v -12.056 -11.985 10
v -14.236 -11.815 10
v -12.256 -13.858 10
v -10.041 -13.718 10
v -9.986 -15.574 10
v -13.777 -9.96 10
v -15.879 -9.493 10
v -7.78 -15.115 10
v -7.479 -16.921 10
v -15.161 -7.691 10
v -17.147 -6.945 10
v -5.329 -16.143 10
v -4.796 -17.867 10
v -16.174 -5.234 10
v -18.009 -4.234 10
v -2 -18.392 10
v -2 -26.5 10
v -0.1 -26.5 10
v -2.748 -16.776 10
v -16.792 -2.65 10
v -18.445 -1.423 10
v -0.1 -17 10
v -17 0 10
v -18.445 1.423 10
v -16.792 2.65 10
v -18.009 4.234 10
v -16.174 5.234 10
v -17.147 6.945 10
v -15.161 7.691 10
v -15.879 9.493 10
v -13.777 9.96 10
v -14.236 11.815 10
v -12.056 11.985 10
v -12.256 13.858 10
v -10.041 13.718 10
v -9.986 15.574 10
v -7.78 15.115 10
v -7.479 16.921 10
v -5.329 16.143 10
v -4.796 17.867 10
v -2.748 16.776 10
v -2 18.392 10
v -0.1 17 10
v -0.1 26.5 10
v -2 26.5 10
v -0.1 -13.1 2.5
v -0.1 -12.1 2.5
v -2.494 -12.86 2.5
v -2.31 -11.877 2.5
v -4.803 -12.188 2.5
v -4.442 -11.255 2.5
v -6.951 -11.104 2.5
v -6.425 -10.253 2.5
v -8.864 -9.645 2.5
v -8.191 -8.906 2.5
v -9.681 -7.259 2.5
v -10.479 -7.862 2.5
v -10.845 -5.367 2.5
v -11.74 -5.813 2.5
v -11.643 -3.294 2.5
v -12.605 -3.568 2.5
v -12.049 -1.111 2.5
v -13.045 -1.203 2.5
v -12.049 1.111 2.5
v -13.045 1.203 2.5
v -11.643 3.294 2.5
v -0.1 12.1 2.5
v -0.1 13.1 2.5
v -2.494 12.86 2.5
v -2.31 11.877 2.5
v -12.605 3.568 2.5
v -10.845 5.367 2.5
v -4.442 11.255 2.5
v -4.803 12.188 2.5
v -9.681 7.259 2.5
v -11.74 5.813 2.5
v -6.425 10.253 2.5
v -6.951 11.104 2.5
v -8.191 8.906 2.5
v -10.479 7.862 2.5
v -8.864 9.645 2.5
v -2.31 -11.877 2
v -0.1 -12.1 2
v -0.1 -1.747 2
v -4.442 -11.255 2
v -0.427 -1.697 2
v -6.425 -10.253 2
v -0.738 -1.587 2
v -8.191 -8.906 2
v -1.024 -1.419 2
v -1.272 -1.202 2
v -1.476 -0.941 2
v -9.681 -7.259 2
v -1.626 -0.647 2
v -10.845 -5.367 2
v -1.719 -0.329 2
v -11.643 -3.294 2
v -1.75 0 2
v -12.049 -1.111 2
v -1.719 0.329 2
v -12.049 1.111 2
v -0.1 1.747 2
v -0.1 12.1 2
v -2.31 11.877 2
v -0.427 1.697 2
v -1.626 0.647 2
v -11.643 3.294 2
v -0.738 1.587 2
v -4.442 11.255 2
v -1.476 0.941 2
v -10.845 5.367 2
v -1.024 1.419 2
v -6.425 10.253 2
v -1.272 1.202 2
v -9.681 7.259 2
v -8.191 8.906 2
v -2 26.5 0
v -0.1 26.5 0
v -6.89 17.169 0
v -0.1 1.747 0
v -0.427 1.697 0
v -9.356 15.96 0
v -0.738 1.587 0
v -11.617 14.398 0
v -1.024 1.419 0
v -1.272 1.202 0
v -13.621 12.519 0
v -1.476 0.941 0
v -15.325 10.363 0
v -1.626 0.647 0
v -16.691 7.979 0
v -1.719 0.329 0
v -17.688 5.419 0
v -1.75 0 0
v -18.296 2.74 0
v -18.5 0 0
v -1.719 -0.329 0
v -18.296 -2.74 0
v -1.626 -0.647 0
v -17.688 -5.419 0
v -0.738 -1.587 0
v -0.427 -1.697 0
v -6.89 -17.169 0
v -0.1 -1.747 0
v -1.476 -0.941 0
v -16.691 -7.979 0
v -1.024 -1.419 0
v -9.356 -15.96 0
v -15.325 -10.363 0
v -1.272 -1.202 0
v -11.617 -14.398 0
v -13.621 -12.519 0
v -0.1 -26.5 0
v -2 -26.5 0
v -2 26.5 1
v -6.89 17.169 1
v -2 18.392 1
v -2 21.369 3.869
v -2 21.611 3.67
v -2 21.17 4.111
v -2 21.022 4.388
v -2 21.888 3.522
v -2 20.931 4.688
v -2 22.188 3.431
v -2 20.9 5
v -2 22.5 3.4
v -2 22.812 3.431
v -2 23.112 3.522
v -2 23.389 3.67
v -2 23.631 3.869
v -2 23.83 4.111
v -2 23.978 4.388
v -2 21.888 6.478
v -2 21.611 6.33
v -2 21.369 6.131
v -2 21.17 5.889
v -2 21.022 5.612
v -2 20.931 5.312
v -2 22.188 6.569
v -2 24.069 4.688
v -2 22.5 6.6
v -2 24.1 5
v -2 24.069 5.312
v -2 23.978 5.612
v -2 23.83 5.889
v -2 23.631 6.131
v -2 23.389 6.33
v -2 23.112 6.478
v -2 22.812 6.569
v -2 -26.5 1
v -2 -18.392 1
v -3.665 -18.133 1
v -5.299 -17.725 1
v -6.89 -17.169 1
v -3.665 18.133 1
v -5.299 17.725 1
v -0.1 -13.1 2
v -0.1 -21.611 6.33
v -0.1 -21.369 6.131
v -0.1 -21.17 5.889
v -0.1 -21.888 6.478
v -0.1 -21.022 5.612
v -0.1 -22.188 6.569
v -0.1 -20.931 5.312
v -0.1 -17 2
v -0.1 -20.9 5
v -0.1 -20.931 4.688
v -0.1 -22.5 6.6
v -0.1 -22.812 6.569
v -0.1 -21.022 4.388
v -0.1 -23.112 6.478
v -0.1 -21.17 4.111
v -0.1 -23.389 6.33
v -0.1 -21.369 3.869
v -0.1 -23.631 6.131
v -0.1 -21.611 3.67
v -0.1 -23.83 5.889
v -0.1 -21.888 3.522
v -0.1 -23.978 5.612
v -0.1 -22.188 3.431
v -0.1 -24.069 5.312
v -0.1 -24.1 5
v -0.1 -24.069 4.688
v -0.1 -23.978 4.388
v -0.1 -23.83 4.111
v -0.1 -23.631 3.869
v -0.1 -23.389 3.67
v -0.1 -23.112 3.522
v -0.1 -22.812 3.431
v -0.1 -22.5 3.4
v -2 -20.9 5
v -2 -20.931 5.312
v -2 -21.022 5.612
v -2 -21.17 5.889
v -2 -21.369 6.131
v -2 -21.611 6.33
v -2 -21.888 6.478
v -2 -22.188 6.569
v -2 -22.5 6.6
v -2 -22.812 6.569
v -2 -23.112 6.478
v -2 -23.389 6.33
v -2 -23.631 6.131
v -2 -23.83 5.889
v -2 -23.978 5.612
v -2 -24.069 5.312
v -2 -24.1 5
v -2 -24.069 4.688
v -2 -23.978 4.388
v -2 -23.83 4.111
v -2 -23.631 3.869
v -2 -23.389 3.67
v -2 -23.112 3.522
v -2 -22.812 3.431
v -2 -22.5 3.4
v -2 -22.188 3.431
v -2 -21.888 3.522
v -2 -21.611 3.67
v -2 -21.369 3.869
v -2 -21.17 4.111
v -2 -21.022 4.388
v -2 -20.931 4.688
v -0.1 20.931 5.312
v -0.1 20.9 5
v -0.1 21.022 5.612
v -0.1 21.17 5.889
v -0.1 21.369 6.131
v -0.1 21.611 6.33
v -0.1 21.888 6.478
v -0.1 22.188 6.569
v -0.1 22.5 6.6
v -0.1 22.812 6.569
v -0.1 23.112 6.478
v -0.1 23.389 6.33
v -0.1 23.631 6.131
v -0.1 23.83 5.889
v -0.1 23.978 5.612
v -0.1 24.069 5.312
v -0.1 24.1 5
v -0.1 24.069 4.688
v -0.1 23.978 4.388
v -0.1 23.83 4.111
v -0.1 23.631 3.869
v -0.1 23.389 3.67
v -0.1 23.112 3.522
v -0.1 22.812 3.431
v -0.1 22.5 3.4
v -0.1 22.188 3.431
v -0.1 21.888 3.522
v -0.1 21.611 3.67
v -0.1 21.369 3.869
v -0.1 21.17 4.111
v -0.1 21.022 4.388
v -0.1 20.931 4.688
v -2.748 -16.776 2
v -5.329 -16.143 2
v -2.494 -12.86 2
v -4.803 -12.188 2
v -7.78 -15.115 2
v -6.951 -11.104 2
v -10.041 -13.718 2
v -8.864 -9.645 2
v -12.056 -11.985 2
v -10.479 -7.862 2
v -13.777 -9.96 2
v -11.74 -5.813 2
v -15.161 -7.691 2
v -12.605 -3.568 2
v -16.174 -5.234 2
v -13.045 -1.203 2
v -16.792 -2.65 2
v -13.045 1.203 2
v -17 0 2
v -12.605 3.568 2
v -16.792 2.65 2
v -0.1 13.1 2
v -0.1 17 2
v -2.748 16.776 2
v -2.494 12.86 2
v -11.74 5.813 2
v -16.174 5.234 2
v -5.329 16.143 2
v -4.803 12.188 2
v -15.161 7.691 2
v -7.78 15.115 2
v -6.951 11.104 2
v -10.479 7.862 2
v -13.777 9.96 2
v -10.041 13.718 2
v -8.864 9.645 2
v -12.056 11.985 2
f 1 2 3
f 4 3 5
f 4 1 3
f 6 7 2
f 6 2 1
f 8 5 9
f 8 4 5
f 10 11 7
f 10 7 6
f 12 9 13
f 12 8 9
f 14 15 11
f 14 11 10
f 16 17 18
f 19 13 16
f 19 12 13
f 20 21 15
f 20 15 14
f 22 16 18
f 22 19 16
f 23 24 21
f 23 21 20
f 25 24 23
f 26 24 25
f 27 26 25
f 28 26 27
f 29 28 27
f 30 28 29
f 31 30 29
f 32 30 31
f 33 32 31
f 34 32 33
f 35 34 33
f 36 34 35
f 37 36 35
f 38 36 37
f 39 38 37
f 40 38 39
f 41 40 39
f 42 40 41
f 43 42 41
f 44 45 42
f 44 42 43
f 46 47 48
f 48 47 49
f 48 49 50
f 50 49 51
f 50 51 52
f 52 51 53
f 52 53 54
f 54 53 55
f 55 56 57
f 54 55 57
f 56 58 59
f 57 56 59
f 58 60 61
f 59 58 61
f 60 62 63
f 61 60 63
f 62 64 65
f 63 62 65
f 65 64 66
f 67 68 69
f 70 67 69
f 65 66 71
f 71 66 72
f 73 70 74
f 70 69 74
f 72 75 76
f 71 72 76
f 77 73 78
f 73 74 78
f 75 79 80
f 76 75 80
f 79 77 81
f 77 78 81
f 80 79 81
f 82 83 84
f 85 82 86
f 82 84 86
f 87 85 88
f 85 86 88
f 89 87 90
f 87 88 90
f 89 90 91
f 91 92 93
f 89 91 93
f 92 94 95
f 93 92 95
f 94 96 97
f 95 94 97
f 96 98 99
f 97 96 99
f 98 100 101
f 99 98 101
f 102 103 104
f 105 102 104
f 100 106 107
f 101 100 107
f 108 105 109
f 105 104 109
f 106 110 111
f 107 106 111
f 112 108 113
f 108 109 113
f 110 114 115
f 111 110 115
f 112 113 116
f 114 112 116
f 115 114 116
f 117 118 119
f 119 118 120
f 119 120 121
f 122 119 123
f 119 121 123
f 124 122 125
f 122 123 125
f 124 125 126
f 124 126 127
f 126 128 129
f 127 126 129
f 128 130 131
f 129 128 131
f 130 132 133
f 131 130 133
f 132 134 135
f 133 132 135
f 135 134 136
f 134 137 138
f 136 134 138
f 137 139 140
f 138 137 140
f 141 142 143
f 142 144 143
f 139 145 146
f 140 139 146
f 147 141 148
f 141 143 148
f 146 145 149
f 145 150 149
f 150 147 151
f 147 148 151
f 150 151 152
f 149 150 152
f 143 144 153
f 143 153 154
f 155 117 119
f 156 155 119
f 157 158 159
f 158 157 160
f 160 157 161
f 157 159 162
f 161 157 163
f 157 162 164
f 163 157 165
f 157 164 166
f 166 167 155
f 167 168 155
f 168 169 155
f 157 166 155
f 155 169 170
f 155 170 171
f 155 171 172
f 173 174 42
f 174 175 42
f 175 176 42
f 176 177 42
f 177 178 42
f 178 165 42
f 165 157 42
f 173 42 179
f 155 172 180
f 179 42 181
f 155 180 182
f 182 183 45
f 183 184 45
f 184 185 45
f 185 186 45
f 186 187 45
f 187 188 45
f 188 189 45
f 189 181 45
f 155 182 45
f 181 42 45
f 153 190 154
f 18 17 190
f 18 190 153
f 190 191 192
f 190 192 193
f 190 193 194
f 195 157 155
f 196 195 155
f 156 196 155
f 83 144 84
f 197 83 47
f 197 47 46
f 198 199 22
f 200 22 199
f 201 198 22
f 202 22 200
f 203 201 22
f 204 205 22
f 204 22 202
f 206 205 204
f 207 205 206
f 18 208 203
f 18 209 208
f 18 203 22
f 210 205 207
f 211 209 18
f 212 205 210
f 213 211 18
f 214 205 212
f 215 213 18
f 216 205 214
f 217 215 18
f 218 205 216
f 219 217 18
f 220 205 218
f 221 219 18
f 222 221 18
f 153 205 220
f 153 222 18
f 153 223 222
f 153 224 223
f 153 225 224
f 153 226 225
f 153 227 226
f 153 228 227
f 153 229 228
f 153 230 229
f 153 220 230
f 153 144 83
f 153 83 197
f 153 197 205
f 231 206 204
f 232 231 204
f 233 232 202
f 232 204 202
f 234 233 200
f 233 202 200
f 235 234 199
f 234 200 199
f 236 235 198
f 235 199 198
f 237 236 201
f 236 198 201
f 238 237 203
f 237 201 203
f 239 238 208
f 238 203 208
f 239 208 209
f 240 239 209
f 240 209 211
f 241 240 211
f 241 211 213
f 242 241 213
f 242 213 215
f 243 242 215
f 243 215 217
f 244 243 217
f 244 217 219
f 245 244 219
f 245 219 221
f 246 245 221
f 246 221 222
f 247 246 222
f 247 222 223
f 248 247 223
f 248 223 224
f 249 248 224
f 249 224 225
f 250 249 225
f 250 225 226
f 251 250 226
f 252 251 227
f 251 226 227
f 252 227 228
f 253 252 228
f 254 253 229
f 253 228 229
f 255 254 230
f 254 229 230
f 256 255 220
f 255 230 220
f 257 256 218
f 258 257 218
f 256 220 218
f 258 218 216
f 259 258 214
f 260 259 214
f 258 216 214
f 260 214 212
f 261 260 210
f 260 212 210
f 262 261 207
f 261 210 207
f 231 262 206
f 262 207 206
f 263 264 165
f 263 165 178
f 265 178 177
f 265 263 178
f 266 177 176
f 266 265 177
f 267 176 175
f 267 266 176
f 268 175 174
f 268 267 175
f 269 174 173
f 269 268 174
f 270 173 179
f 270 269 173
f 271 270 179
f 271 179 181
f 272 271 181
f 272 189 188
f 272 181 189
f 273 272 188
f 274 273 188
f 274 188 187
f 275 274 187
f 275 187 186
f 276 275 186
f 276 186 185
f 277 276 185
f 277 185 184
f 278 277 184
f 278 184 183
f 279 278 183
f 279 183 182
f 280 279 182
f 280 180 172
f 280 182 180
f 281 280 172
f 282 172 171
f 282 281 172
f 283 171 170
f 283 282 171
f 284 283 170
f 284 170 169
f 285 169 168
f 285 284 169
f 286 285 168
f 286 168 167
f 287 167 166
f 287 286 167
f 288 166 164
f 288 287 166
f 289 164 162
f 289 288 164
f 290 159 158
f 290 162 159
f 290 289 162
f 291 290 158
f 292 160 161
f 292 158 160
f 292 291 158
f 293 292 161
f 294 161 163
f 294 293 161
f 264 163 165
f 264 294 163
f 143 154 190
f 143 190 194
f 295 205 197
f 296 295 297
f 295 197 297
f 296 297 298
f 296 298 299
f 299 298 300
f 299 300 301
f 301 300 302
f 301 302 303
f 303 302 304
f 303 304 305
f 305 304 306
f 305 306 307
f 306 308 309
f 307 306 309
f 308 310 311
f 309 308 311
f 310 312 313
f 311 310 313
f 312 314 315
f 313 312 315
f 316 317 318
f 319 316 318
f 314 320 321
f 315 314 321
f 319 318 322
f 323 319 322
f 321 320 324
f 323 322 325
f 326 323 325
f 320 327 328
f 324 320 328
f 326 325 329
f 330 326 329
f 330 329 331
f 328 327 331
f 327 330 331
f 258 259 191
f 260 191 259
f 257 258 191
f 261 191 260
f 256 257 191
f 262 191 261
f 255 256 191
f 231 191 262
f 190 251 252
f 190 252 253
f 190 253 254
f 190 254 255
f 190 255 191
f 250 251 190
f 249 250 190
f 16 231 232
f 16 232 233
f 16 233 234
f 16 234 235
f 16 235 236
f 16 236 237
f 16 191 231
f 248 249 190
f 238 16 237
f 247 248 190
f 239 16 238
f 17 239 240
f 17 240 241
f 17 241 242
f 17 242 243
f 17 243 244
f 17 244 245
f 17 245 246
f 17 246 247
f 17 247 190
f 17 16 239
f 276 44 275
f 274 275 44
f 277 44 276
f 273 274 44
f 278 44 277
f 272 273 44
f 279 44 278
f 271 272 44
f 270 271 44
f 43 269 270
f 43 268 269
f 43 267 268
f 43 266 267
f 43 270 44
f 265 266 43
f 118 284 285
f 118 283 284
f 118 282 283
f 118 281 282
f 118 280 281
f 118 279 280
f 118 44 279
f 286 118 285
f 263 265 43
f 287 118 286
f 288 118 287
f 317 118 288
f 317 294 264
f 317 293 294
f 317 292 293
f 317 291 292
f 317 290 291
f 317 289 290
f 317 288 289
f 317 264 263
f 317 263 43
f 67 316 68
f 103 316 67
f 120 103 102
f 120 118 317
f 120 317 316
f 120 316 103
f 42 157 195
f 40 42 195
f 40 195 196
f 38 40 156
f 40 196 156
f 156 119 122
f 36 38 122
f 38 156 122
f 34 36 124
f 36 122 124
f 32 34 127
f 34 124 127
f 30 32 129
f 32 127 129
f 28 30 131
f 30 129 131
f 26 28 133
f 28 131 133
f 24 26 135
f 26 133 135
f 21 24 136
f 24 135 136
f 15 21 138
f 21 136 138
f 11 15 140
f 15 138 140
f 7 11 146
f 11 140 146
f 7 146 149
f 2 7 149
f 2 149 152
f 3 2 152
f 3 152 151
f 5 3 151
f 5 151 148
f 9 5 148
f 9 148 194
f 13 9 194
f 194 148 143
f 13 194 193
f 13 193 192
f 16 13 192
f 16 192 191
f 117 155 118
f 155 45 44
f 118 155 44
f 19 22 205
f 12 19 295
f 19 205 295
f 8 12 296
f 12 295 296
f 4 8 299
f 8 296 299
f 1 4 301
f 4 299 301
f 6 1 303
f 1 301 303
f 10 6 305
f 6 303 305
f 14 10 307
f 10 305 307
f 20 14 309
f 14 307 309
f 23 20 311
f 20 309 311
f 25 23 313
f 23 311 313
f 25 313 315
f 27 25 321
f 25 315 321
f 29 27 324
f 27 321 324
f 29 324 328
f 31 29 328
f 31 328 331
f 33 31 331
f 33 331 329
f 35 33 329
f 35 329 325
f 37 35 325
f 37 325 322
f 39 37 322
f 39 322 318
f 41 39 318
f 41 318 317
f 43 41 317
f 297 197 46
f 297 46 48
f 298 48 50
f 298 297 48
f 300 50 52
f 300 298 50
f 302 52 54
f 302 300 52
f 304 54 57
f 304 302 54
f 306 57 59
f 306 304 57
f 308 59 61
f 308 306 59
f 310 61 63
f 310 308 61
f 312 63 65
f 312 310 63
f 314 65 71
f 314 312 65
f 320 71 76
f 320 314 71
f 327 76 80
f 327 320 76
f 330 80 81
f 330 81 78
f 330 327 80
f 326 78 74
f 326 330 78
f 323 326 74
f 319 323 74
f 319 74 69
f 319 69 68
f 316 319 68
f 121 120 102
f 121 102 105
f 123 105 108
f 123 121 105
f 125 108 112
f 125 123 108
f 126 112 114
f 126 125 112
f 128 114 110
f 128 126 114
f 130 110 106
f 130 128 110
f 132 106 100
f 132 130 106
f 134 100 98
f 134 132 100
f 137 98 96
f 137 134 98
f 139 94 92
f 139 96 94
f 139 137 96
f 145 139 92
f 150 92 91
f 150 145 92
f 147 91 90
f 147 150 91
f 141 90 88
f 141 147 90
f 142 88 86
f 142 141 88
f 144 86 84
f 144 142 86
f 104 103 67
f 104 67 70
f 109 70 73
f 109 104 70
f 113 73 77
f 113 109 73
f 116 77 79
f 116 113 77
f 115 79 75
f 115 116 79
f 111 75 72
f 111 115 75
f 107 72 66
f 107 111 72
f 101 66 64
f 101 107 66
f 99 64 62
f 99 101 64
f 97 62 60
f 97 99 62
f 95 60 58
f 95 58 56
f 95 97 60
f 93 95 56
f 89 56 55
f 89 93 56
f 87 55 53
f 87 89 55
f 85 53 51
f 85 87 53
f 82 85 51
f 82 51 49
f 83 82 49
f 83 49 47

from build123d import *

# Parameters (mm, degrees)
BOSS_EXTRUDE1_DEPTH = 2
BOSS_EXTRUDE2_DEPTH = 10
BOSS_EXTRUDE3_DEPTH = 10
SKETCH3_R           = 1.6
CUT_EXTRUDE1_DEPTH  = 10
BOSS_EXTRUDE4_DEPTH = 1
MOVE_FACE1_DEPTH    = 10
BOSS_EXTRUDE5_DEPTH = 0.5


# Read off the part's stored shape, not the designer's step: Move Face1
with BuildPart() as part:
    # Sketch1 → Boss-Extrude1 (new body)
    with BuildSketch(Plane.XY):
        with BuildLine():
            Line((0, 17), (0, 1.65))
            ThreePointArc((0, 1.65), (-1.65, 0), (0, -1.65))
            Line((0, -1.65), (0, -17))
            ThreePointArc((0, -17), (-17, 0), (0, 17))
        make_face()
    extrude(amount=BOSS_EXTRUDE1_DEPTH)

    # Sketch2 → Boss-Extrude2 (add)
    with BuildSketch(Plane.XY):
        with BuildLine():
            Line((0, 17), (0, 18.5))
            ThreePointArc((0, 18.5), (-18.5, 0), (0, -18.5))
            Line((0, -18.5), (0, -17))
            ThreePointArc((0, -17), (-17, 0), (0, 17))
        make_face()
    extrude(amount=BOSS_EXTRUDE2_DEPTH)

    # Sketch4 → Boss-Extrude3 (add)
    with BuildSketch(Plane.XY.offset(10)):
        Polygon((0, -18.5), (-1.127101366, -17.373839009), (-2, -17.373839009), (-2, -22.499993139), (-2, -26.5), (0, -26.5), align=None)
    boss_extrude3 = extrude(amount=-BOSS_EXTRUDE3_DEPTH)

    # Sketch3 → Cut-Extrude1 (cut)
    with BuildSketch(Plane(origin=(0, 0, 0), x_dir=(0, 0, -1), z_dir=(1, 0, 0))):
        with Locations(Location((-5, -22.5, 0), (0, 0, 90))):
            Circle(SKETCH3_R)
    cut_extrude1 = extrude(amount=-CUT_EXTRUDE1_DEPTH, mode=Mode.SUBTRACT)

    # Sketch5 → Boss-Extrude4 (add)
    with BuildSketch(Plane(origin=(0, 0, 0), x_dir=(-1, 0, 0), z_dir=(0, 0, -1))):
        Polygon((2, -26.5), (6.889586723, -17.169263082), (2, -17.169263082), align=None)
    boss_extrude4 = extrude(amount=-BOSS_EXTRUDE4_DEPTH)

    # Mirror1: Boss-Extrude3, Cut-Extrude1, Boss-Extrude4 across plane
    add(boss_extrude3.mirror(Plane.ZX))
    add(cut_extrude1.mirror(Plane.ZX), mode=Mode.SUBTRACT)
    add(boss_extrude4.mirror(Plane.ZX))

    # Move Face1 outline → Move Face1 (cut)
    with BuildSketch(Plane.XY):
        with BuildLine():
            ThreePointArc((-0.1, 1.747140521), (-1.75, 0), (-0.1, -1.747140521))
            Line((-0.1, -1.747140521), (-0.1, -26.5))
            Line((-0.1, -26.5), (0, -26.5))
            Line((0, -26.5), (0, -1.65))
            ThreePointArc((0, -1.65), (-1.65, 0), (0, 1.65))
            Line((0, 1.65), (0, 26.5))
            Line((0, 26.5), (-0.1, 26.5))
            Line((-0.1, 26.5), (-0.1, 1.747140521))
        make_face()
    extrude(amount=MOVE_FACE1_DEPTH, mode=Mode.SUBTRACT)

    # Sketch6 → Boss-Extrude5 (add)
    with BuildSketch(Plane.XY.offset(2)):
        with BuildLine():
            Line((-0.1, 13.099618315), (-0.1, 12.09958677))
            ThreePointArc((-0.1, 12.09958677), (-12.1, 0), (-0.1, -12.09958677))
            Line((-0.1, -12.09958677), (-0.1, -13.099618315))
            ThreePointArc((-0.1, -13.099618315), (-13.1, 0), (-0.1, 13.099618315))
        make_face()
    extrude(amount=BOSS_EXTRUDE5_DEPTH)


solid = part.part
